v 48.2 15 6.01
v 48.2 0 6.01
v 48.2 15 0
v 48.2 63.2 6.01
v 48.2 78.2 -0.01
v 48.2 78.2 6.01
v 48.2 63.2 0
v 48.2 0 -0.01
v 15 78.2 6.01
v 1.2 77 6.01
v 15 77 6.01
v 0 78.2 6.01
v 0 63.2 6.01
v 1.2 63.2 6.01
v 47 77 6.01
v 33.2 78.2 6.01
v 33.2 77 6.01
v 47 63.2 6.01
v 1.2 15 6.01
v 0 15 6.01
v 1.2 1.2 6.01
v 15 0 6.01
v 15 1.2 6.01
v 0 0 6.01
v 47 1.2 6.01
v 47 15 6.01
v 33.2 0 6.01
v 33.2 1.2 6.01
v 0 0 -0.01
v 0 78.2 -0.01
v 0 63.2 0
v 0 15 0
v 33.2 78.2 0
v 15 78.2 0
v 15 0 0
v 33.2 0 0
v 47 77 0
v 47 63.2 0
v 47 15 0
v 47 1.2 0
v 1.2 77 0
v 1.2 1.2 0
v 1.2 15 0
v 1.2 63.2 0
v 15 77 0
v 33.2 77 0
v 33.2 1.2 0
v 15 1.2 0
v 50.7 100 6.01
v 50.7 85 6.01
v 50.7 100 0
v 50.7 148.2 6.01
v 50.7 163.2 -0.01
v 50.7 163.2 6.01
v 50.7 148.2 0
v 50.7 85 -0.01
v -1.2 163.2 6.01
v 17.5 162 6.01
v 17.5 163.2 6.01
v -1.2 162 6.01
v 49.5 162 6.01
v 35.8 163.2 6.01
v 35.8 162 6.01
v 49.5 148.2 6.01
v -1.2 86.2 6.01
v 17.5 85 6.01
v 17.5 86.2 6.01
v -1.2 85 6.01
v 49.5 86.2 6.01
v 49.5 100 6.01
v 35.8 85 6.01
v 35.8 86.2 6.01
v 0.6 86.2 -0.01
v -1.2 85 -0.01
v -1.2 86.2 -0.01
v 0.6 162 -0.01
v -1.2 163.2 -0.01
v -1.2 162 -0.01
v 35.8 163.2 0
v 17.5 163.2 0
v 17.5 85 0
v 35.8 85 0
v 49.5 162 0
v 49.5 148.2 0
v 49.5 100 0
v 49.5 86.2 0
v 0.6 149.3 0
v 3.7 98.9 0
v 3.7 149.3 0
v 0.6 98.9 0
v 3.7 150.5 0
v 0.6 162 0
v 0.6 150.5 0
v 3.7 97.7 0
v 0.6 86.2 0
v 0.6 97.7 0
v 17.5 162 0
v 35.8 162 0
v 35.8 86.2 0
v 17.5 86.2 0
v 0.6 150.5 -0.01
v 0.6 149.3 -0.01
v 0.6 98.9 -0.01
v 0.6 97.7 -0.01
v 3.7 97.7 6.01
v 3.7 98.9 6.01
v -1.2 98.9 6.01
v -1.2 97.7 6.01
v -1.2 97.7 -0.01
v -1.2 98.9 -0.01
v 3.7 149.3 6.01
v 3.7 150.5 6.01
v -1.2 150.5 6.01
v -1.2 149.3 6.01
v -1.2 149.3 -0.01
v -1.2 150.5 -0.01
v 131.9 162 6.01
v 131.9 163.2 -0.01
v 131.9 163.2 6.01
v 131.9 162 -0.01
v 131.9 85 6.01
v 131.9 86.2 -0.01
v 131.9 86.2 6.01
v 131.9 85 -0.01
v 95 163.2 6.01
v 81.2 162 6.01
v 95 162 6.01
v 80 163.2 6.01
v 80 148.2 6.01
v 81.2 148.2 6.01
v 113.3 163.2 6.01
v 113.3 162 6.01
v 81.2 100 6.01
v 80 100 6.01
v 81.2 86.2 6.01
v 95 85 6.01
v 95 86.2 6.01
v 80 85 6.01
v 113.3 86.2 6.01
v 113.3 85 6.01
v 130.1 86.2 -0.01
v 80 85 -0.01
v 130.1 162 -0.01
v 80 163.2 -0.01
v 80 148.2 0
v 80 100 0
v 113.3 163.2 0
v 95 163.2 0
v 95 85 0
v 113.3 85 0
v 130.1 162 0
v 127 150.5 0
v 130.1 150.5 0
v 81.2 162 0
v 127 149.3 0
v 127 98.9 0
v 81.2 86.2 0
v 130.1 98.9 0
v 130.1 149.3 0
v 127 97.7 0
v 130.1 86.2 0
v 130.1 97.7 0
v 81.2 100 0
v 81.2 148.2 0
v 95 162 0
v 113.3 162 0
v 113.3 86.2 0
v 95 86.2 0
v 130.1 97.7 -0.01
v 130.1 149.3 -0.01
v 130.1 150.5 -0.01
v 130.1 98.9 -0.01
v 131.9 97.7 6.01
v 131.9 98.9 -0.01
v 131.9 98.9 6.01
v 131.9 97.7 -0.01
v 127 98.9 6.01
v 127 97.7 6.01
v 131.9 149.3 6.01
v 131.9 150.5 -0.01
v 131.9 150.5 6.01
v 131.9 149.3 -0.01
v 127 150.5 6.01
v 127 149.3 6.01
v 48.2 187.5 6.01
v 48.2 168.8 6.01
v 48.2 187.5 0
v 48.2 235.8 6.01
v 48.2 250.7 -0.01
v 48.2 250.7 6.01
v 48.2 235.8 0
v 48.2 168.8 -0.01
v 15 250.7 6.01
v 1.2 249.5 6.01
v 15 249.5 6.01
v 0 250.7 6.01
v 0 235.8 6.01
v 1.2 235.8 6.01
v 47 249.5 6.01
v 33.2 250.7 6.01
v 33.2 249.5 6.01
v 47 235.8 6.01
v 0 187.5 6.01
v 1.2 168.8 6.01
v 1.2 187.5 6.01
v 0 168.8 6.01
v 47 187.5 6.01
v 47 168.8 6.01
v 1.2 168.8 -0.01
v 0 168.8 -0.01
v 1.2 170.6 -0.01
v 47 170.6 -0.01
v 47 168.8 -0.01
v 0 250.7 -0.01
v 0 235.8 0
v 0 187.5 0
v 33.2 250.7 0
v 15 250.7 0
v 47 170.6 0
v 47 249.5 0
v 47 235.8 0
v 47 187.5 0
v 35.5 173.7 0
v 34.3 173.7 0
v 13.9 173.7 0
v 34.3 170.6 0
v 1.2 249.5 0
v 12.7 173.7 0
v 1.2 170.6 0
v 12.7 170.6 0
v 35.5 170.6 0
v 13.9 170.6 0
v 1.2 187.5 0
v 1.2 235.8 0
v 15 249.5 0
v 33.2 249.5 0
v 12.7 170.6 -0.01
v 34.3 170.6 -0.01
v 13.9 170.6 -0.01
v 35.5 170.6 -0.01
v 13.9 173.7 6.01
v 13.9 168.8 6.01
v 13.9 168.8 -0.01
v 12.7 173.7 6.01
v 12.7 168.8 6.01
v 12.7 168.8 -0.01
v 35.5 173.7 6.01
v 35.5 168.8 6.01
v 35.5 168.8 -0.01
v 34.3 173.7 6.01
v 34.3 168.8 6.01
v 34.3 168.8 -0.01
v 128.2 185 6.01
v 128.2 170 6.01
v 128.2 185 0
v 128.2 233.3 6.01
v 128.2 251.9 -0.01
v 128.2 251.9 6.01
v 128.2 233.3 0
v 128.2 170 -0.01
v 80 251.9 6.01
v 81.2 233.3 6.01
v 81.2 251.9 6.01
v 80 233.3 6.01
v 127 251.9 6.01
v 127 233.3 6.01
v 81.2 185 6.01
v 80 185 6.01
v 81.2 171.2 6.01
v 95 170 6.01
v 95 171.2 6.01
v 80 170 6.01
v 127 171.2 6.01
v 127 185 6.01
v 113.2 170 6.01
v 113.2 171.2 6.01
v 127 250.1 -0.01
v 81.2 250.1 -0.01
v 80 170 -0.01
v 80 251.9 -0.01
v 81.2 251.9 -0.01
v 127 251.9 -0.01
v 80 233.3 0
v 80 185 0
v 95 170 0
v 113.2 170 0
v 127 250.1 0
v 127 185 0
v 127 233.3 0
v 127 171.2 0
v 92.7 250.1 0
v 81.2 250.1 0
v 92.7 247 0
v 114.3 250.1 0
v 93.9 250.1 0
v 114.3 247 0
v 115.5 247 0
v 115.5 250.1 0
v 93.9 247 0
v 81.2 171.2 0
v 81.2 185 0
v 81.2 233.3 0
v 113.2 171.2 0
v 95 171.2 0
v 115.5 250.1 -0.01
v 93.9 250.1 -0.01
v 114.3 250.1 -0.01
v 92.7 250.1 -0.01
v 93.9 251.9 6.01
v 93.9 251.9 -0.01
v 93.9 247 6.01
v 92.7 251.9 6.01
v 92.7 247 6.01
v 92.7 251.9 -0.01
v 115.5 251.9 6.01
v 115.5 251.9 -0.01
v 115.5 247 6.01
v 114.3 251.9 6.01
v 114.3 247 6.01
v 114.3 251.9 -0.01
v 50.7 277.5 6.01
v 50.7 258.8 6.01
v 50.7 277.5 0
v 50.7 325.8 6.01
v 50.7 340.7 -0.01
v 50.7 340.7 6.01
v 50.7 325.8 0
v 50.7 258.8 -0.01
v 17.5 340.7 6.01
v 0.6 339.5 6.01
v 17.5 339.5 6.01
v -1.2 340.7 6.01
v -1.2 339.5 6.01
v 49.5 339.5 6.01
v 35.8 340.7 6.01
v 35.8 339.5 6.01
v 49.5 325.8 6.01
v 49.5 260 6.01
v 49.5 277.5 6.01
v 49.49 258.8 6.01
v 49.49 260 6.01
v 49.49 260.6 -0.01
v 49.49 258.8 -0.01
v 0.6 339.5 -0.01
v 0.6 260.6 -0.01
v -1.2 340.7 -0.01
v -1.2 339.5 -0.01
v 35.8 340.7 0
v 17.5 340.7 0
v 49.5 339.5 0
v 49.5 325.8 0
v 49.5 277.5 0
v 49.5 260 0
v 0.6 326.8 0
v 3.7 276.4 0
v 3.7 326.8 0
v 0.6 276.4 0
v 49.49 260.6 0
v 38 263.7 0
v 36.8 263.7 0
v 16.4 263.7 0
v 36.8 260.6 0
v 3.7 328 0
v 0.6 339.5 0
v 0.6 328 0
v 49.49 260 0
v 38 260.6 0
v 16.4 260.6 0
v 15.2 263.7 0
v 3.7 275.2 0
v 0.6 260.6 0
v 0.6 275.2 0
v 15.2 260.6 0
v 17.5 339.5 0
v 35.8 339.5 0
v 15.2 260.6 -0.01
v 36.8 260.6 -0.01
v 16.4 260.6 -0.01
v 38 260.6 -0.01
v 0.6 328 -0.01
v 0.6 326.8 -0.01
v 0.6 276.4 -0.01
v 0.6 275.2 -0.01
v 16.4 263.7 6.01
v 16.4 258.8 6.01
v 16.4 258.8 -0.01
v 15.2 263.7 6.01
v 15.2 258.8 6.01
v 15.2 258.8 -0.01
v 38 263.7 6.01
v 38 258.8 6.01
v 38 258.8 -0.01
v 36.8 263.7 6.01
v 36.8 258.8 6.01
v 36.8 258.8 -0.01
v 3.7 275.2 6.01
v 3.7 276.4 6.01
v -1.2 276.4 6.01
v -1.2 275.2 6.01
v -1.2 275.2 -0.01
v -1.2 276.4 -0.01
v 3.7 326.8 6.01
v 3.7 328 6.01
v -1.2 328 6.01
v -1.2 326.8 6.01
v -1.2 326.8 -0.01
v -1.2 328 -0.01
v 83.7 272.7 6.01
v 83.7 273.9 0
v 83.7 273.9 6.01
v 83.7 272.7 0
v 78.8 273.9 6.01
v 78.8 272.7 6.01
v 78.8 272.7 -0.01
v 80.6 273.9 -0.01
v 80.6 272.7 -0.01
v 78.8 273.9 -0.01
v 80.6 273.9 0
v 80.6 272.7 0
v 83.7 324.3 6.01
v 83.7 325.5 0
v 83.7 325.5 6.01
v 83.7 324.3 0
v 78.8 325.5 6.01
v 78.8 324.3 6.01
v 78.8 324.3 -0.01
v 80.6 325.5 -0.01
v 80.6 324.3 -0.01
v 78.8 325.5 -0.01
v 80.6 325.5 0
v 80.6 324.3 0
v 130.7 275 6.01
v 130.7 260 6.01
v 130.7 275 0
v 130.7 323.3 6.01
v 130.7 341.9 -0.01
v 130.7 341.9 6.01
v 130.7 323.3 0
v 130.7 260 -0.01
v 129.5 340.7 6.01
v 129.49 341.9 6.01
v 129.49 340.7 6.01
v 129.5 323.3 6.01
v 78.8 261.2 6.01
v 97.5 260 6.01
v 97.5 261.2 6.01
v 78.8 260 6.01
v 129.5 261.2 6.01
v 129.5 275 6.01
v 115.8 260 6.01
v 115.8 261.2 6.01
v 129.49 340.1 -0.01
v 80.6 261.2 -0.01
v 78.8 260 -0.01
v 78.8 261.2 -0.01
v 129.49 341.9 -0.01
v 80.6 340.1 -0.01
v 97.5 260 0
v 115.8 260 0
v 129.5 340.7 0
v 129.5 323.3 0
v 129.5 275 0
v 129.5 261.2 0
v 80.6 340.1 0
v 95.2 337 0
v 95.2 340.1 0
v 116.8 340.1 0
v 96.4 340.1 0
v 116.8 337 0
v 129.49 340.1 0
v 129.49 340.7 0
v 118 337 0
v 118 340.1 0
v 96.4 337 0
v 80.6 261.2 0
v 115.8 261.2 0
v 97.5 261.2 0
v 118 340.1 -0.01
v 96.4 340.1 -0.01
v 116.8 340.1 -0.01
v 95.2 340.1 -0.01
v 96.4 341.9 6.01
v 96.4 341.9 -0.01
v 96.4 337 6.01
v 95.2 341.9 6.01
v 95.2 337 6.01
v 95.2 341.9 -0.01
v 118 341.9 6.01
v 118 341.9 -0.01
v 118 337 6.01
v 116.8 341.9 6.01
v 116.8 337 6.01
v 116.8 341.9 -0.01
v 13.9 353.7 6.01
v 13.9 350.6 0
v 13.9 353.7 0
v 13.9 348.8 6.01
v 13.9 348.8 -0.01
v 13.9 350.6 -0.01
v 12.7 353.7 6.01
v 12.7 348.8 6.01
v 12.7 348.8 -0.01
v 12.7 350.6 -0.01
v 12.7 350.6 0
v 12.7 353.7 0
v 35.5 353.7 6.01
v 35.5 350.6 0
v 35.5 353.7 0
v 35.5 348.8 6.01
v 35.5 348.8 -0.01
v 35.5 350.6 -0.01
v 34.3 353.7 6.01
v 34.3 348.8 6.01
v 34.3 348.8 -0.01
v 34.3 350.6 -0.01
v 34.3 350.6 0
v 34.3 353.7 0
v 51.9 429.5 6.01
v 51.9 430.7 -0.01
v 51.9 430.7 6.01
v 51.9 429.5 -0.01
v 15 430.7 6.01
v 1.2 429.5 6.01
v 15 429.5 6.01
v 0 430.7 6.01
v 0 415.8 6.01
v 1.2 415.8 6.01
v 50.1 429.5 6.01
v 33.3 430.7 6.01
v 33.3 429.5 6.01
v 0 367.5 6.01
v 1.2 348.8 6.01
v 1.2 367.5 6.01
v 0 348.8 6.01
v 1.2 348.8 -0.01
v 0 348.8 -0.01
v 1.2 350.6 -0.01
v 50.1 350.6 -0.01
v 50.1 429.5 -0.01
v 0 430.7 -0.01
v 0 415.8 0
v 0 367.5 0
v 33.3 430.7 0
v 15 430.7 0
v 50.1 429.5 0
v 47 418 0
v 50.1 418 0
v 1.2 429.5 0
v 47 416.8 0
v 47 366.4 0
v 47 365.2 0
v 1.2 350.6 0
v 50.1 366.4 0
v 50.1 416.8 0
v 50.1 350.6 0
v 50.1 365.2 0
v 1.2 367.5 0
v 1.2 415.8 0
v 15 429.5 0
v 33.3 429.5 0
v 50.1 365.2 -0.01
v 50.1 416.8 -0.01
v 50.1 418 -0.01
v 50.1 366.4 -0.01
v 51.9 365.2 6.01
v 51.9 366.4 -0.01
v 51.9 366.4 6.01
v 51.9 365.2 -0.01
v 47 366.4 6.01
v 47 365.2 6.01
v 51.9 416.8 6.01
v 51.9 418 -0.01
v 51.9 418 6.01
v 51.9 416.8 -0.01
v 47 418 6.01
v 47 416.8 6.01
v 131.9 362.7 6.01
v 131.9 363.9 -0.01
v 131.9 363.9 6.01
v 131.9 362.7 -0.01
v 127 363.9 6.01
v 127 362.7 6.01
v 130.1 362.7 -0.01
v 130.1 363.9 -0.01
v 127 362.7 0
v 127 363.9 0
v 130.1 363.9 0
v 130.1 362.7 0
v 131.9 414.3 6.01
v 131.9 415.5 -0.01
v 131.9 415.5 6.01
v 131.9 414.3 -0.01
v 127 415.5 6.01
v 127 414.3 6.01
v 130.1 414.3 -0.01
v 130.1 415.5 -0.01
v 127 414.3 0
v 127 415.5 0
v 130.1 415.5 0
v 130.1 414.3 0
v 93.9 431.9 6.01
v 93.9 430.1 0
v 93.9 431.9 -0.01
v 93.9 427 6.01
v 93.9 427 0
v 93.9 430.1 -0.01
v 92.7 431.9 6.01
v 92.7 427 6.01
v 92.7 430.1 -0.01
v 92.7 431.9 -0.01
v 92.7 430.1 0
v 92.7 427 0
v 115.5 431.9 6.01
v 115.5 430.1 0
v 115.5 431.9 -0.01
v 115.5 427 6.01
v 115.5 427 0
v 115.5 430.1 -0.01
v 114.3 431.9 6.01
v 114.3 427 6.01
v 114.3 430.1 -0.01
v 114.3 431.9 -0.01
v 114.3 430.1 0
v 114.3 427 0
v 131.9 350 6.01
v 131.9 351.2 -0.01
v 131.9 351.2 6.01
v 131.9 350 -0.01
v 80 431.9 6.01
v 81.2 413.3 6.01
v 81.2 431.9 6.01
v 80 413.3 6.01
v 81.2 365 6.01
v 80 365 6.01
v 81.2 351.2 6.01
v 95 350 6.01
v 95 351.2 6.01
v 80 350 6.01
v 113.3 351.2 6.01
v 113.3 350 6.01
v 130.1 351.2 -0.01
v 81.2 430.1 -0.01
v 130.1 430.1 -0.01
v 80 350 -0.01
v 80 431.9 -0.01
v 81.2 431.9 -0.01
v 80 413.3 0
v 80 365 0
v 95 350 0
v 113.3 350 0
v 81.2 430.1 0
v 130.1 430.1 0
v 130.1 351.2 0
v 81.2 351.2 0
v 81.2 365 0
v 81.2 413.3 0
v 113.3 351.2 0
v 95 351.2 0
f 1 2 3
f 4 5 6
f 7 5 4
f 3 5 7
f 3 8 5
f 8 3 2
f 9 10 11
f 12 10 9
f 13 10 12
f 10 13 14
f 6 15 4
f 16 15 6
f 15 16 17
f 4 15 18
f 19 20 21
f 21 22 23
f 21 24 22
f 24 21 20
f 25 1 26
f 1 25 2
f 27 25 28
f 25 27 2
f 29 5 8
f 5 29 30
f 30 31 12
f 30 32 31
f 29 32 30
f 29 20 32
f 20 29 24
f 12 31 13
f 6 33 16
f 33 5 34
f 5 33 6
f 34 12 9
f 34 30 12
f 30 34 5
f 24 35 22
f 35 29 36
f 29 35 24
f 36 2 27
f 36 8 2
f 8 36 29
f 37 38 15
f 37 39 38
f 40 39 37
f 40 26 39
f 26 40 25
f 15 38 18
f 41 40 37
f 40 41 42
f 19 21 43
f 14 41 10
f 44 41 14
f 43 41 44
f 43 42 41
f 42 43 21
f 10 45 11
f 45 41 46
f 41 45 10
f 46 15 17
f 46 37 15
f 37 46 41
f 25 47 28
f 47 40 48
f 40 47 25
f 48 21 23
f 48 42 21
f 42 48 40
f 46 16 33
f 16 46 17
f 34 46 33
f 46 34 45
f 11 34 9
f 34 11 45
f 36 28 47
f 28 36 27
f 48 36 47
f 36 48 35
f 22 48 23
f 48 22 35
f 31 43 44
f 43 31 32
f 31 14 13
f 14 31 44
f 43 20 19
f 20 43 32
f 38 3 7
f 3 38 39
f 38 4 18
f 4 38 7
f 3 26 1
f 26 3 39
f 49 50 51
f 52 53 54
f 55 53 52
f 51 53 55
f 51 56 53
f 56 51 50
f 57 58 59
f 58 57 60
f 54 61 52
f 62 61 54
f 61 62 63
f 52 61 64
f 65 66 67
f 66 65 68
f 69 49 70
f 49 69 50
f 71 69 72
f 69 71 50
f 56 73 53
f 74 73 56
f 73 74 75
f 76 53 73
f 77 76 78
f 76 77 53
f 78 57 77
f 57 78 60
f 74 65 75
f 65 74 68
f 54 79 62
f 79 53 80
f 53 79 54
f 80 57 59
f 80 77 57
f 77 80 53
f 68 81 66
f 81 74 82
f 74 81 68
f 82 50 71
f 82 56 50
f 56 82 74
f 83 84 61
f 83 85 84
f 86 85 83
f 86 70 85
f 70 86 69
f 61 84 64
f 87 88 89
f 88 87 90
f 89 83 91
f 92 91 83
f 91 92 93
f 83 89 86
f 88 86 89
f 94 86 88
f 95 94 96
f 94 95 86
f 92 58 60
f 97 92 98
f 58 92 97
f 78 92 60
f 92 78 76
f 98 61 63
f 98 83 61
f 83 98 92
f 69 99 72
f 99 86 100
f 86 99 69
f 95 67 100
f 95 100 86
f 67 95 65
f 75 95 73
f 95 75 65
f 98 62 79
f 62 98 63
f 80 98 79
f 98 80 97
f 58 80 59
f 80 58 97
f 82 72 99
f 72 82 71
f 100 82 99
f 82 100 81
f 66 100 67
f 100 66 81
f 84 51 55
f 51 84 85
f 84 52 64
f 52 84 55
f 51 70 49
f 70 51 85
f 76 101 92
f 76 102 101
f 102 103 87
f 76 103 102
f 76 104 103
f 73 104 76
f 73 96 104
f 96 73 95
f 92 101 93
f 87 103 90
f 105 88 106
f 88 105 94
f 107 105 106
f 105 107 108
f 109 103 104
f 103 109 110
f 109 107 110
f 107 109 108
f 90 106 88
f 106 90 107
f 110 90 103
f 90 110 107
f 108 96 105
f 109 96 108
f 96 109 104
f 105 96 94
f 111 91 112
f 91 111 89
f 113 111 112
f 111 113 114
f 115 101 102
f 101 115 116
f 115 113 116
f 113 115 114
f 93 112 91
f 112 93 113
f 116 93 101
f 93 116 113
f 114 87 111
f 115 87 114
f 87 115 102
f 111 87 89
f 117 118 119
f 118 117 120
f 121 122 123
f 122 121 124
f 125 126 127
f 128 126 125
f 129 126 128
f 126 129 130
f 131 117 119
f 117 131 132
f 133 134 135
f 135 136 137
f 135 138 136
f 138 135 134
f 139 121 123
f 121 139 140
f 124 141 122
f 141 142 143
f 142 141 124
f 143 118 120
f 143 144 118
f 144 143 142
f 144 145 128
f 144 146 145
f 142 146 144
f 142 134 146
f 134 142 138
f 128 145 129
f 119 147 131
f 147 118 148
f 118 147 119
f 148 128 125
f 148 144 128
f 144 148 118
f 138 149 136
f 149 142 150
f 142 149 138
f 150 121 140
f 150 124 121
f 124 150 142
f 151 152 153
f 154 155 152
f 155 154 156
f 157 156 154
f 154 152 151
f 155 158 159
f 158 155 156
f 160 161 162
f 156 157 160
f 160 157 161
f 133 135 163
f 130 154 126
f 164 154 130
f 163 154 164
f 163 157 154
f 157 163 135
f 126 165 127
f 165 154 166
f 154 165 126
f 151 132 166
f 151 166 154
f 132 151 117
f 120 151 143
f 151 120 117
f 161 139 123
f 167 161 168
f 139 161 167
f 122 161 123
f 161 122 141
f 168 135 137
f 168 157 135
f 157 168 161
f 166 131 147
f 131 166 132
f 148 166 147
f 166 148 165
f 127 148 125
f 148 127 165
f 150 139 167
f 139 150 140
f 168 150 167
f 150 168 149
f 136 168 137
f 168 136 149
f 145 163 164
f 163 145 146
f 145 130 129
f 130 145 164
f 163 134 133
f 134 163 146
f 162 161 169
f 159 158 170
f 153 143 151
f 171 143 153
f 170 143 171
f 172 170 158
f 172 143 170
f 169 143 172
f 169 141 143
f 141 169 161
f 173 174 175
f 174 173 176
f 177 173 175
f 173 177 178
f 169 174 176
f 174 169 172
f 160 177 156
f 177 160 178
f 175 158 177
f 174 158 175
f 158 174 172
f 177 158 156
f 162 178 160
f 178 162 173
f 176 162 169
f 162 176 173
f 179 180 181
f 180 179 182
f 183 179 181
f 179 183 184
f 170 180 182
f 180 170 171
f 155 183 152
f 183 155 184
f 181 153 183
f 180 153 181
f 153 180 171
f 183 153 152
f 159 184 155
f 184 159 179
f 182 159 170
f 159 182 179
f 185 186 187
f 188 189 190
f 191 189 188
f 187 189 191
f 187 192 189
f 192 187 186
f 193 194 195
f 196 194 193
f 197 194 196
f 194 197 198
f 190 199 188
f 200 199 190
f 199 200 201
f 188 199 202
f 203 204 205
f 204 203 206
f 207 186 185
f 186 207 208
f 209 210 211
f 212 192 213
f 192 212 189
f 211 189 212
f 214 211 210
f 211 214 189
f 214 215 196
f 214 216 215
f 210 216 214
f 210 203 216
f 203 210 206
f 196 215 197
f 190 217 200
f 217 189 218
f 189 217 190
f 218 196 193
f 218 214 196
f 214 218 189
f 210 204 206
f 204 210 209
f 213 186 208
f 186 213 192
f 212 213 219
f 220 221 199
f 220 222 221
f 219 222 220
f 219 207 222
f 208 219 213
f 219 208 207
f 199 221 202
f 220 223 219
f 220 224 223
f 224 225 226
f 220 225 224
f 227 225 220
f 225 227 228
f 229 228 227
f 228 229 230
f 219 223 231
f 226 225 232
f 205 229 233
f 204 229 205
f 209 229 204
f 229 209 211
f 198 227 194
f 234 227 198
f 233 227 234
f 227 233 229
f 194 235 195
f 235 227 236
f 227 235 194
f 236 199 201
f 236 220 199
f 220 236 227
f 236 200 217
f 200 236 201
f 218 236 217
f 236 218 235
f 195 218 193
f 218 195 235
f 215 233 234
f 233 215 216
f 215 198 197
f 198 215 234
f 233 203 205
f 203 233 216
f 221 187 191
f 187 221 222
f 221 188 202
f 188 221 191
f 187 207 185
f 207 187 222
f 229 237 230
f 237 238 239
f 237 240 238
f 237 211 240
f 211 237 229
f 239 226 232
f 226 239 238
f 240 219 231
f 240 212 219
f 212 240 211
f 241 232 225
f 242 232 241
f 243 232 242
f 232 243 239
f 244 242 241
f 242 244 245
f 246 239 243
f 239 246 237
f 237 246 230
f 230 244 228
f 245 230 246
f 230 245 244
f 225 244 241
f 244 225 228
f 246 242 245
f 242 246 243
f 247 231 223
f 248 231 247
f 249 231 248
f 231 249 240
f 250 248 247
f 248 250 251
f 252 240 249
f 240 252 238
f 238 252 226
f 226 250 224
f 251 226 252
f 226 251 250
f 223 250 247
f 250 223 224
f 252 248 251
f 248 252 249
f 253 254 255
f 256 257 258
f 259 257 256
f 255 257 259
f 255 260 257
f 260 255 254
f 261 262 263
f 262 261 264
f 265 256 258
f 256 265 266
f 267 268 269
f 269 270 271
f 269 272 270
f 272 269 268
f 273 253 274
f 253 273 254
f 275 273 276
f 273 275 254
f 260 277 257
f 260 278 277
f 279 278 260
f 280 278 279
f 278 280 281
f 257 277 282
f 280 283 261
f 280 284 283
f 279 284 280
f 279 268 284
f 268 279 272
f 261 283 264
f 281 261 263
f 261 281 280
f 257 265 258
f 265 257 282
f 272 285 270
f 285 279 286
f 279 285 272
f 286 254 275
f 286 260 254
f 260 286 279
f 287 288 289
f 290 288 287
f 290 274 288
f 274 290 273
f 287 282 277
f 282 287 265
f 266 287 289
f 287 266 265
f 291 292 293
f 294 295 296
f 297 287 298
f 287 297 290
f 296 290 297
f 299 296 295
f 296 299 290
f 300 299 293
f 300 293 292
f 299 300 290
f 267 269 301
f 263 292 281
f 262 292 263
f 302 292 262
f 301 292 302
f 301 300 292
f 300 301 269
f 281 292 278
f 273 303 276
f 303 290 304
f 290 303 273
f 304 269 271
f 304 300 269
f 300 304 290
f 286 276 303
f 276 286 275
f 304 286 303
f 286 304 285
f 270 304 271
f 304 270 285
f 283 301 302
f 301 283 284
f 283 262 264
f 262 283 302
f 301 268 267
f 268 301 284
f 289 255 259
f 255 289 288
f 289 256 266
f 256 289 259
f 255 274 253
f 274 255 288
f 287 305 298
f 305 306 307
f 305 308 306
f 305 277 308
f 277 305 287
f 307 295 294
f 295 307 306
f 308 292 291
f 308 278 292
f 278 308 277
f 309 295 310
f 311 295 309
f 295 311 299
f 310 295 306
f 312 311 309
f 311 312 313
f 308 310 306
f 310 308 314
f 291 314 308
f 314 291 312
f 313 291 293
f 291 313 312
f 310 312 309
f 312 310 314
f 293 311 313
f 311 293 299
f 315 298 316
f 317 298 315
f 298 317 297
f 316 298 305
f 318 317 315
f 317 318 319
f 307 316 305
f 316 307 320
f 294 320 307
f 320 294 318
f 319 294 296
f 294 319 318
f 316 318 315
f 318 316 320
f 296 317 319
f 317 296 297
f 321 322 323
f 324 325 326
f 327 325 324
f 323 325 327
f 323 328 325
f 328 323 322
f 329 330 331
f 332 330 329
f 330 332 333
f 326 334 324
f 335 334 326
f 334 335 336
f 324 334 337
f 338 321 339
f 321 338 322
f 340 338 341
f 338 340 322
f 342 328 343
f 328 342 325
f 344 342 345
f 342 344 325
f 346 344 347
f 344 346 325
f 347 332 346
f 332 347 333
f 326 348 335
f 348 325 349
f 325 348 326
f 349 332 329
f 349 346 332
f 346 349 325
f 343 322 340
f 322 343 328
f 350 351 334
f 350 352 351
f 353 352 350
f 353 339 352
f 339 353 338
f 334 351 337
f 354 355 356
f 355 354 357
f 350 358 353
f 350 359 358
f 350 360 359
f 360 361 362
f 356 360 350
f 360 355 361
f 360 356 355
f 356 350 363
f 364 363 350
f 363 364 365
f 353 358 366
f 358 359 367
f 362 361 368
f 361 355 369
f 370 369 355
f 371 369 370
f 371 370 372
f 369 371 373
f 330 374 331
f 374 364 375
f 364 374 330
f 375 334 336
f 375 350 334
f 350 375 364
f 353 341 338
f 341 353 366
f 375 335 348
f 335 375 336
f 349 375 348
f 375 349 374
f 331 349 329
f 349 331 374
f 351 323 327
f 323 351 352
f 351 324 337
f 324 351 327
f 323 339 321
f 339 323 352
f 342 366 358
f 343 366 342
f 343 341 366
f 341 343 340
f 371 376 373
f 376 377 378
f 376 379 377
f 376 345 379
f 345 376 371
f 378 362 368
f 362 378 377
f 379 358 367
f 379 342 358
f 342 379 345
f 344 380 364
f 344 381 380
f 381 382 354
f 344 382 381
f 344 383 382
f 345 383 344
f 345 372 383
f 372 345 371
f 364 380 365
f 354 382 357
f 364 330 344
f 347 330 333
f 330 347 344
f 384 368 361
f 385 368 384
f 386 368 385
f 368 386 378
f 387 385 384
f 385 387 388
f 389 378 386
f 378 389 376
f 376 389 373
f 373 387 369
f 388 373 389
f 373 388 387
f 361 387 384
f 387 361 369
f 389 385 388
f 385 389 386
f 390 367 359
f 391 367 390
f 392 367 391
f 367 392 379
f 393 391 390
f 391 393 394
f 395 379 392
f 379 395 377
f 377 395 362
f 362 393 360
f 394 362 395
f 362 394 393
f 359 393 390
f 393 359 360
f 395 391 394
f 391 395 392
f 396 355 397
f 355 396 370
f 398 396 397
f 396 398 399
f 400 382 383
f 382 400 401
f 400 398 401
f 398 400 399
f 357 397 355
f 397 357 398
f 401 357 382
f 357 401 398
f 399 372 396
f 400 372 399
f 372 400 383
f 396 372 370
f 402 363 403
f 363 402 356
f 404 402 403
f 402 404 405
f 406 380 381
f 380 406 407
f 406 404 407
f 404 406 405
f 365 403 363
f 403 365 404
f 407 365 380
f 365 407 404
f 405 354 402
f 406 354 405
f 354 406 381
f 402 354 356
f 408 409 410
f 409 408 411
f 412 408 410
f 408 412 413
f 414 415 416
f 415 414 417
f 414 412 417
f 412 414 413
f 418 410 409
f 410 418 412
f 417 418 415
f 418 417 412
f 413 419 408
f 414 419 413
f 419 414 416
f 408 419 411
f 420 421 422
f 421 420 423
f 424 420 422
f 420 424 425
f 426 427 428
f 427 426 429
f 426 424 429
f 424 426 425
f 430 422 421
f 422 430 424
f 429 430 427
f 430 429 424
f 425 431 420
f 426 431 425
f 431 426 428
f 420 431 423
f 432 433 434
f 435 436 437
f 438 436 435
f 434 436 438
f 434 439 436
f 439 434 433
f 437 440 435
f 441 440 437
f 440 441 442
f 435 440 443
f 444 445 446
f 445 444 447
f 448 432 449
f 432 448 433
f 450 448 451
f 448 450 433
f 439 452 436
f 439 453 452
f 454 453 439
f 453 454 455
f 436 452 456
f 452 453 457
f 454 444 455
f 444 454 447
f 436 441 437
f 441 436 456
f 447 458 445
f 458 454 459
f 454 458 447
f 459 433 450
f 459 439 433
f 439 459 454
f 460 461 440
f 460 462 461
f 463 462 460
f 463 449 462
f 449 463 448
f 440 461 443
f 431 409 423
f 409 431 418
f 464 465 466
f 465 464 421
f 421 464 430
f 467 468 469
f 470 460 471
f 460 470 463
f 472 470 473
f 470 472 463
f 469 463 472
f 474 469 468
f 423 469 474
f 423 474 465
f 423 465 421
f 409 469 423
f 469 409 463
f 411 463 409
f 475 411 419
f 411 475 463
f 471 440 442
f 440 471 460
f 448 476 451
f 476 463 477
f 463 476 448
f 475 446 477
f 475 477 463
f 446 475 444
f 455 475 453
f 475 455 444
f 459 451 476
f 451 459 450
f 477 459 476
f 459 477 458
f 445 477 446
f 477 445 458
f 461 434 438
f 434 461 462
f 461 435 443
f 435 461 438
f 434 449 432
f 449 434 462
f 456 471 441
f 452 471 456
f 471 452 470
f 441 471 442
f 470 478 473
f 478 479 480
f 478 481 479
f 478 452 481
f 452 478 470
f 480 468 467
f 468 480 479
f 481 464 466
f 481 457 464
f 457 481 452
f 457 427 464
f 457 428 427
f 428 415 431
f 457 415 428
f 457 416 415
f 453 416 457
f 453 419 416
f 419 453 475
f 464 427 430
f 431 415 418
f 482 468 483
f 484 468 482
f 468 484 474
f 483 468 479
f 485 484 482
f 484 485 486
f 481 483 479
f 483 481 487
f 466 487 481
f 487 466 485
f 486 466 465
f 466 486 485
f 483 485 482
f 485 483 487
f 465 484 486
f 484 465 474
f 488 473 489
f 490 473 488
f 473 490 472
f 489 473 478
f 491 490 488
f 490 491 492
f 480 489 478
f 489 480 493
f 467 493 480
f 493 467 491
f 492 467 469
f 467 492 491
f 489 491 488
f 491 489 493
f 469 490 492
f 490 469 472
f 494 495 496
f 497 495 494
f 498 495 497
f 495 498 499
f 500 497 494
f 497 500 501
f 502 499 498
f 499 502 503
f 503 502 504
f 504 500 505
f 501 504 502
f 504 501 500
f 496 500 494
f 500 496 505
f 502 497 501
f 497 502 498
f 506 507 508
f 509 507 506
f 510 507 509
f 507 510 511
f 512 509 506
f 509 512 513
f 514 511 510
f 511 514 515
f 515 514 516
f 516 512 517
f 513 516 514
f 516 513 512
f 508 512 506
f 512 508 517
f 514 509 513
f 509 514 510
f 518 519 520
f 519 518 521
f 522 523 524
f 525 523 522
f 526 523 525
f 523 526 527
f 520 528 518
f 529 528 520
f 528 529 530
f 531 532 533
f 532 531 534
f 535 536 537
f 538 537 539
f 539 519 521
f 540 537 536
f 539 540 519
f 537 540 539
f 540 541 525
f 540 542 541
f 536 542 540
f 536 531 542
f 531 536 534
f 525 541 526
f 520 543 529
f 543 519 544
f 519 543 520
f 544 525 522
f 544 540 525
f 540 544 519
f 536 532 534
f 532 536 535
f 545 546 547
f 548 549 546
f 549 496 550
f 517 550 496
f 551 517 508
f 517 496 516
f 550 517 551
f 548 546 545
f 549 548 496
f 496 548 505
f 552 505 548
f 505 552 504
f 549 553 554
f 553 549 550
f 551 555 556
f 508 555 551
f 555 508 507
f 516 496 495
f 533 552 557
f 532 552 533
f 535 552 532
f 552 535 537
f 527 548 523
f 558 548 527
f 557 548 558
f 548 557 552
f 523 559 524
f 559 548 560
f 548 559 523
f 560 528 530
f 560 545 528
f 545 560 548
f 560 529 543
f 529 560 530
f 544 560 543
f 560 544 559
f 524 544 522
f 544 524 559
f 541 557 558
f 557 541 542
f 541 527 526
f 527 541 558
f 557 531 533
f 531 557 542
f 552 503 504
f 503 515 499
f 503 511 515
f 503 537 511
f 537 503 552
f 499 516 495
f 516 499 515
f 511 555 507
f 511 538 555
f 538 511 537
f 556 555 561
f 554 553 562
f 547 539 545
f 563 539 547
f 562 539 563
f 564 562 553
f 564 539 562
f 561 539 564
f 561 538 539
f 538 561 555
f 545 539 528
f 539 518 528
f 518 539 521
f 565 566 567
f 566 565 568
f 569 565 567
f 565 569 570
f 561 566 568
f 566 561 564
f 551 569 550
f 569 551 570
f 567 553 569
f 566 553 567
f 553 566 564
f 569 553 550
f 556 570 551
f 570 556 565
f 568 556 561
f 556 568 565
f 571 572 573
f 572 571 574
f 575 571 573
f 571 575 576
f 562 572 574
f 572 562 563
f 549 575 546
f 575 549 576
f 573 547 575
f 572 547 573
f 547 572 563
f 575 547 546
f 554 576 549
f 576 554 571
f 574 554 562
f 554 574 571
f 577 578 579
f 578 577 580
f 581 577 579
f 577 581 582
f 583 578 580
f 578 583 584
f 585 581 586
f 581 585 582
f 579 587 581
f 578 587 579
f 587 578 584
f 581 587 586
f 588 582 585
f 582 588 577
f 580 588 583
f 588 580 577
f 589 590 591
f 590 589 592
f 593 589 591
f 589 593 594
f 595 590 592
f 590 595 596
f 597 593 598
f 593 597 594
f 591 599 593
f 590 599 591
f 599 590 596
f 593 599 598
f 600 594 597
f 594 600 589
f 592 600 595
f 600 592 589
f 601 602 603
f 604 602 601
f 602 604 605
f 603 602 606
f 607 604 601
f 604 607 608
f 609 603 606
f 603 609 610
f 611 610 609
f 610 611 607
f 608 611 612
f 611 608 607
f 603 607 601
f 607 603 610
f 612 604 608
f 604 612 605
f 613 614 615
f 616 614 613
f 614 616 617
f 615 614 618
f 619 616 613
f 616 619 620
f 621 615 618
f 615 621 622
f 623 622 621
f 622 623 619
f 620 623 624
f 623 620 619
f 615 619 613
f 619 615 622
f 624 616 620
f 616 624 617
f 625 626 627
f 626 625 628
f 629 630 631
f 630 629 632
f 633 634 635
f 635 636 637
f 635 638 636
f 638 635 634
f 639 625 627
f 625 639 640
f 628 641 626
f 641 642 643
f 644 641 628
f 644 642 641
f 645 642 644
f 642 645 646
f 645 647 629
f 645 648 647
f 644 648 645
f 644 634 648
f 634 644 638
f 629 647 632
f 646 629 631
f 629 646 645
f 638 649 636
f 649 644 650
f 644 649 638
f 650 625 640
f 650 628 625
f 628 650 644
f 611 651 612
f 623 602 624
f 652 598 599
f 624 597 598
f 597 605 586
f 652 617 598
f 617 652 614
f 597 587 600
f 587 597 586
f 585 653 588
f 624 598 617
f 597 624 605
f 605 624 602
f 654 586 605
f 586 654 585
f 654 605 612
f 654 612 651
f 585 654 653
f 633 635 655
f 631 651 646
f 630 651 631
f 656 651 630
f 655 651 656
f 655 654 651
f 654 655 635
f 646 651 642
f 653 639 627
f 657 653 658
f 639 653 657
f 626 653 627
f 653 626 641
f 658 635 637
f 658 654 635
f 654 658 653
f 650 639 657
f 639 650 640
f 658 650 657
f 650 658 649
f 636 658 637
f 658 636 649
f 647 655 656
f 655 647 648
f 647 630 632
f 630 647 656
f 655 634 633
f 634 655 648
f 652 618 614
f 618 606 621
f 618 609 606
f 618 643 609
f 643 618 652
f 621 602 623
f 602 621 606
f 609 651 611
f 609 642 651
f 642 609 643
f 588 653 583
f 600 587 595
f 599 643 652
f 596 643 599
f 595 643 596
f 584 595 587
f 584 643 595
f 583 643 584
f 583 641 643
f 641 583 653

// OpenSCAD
// file: ../../Base/Boxes.scad
// Fischertechnik Box Foundation
// Pre-designed Boxes

use <Constants.scad>

include <PlacementOptions.scad>

box190Width = 190;
box190Depth = 130;
box130Width = 130;
box130Depth = 95;
boxUsageHeight = 33.9;
boxWallThickness = 2.4;
boxBaseThickness = 1.0;

// getBoxWallThickness()
// Gets the wall thickness of a Fischertechnik Box

function getBoxWallThickness() = boxWallThickness;

// Gets the usable height of a fischertechnik box
function getBoxUsageHeight() = boxUsageHeight;

// Gets the thickness of the Fischertechnik box base.
function getBoxBaseThickness() = boxBaseThickness;

// Gets the usable inner space of a Box 190 as an x/y-list
function getBox190Space() = [
    box190Width - 2*getBoxWallThickness(), 
    box190Depth - 2*getBoxWallThickness() ];

// Imports the Fischertechnik empty box 130x190 mm and places it at position 0,0
// 190x130 are the outer sizes, the inner space is slightly smaller. Use getBox190Space() to get the inner sizes.
// This module needs the STL file "Fischertechnik Box 130x190.stl" in the library path.
// The box is positioned that the usable inner space is at the 0,0,0 position. The

module Box190() {
    translate([-getBoxWallThickness(),-getBoxWallThickness(),-getBoxBaseThickness()])
        import("Fischertechnik Box 130x190.stl", convexity=3);
}

// Gets the usable inner space of a Box 130 as an x/y-list
function getBox130Space() = [
    box130Width - 2*getBoxWallThickness(), 
    box130Depth - 2*getBoxWallThickness() ];

// Imports the Fischertechnik empty box 95x130 mm and places it at position 0,0
// 190x130 are the outer sizes, the inner space is slightly smaller. Use getBox190Space() to get the inner sizes.
// This module needs the STL file "Fischertechnik Box 95x130.stl" in the library path.
// The box is positioned that the usable inner space is at the 0,0,0 position. The

module Box130() {
    translate([-getBoxWallThickness(),-getBoxWallThickness(),-getBoxBaseThickness()])
        import("Fischertechnik Box 95x130.stl", convexity=3);
}

// Creates a web at the specified box walls
// corner 0 = LowerLeft, 1 = UpperLeft, 2 = UpperRight, 3 = LowerRight
// side 0 = LeftOfCorner, 1 = RightOfCorner
// distance = Distance in mm from the corner
// box = inner width and depth of the box (default: Box 190)
// webWidth = length of the web (default is 3 mms)
// webThickness = thickness of the web (default is 1 mm)

module BoxWeb(corner, side, distance, box=getBox190Space(), webWidth=3, webThickness=1.0) {
    sink = getBoxWallThickness()/2;

    width = (corner % 2 == 0) ? 
            (side == LeftOfCorner ? webWidth : webThickness) :
            (side == LeftOfCorner ? webThickness : webWidth);

    depth = (corner % 2 == 0) ? 
            (side == RightOfCorner ? webWidth : webThickness) :
            (side == RightOfCorner ? webThickness : webWidth);
    
    xDiff = corner == LowerLeft ? 
                (side == LeftOfCorner ? -sink : distance) :
            (corner == UpperLeft ?                
                (side == LeftOfCorner ? distance : -sink) :
            (corner == UpperRight ?
                (side == LeftOfCorner ? box.x-webWidth+sink : box.x-distance-webThickness) :
                (side == LeftOfCorner ? box.x-distance-webThickness: box.x-webWidth+sink)));

    yDiff = corner == LowerLeft ? 
                (side == RightOfCorner ? -sink : distance) :
            (corner == UpperLeft ?
                (side == RightOfCorner ? box.y-distance : box.y-webWidth+sink) :
            (corner == UpperRight ?
                (side == RightOfCorner ? box.y-webWidth+sink : box.y-distance) :
                (side == RightOfCorner ? distance : -sink)));
    
    translate([xDiff, yDiff, -getExcess()])
        cube([width, depth, boxUsageHeight + 2*getExcess()]);
}
// file: ../../Base/Rotation.scad
// Fischertechnik Box Foundation
// Geometry Helpers Rotation

include <PlacementOptions.scad>

// getRotatedSpace(space, rotation=NoRotation)
// Rotates the space dependent on the specified rotation

function getRotatedSpace(space, rotation=NoRotation) = [
    (rotation == Rotate90 || rotation == Rotate270) ? space.y : space.x,
    (rotation == Rotate90 || rotation == Rotate270) ? space.x : space.y
];

// Rotates the given space around the fixed left lower corner
// space = the space the children needs as width/depth list [width,depth]
// rotation = 0 Rotate0 degrees, 1 Rotate90 degrees, 2 Rotate180 degrees, 3 Rotate270 degrees (equivalent to -90)

module RotateFix(space, rotation=Rotate0) {
    dy = (rotation == Rotate0 || rotation == Rotate270) ? 0 :
        (rotation == Rotate90) ? space.x :
        space.y;
    dx = (rotation < Rotate180) ? 0 :
        (rotation == Rotate180) ? space.x :
        space.y;
    
    translate([dx, dy, 0])
        rotate([0, 0, rotations[rotation]])
            children();
}
// file: ../../Base/Alignment.scad
// Fischertechnik Box Foundation
// Geometry Helpers Alignment

include <PlacementOptions.scad>

// getAlignedX(elementWidth, spaceWidth, align=AlignRight, offset=0)
// Gets the aligned X offset of an element with the given
// width in the given space.
// elementWidth = The width of the element to positon
// spaceWidth = The space where the element should be aligned
// align = 0 AlignLeft, 1 AlignCenter, 2 AlignRight
// offset = an optional offset from the aligned position. When
// aligned left or centered, then positive values are in X direction.
// When aligned right then positive values are in negative X direction.

function getAlignedX(elementWidth, spaceWidth, align=AlignRight, offset=0) =
    (align == AlignLeft) ?
        offset :
        ((align == AlignCenter) ?
        (spaceWidth - elementWidth)/2 + offset :
        spaceWidth - offset - elementWidth);

// getAlignedY(elementDepth, spaceDepth, align=AlignTop, offset=0)
// Gets the aligned Y offset of an element with the given
// depth in the given space.
// elementDepth = The depth of the element to positon
// spaceDepth = The space where the element should be aligned
// align = 0 AlignBottom, 1 AlignCenter, 2 AlignTop
// offset = an optional offset from the aligned position. When
// aligned bottom or centered, then positive values are in Y direction.
// When aligned top then positive values are in negative Y direction.

function getAlignedY(elementDepth, spaceDepth, align=AlignTop, offset=0) =
    (align == AlignBottom) ?
        offset :
        ((align == AlignCenter) ?
        (spaceDepth - elementDepth)/2 + offset :
        spaceDepth - offset - elementDepth);
// file: ../../Base/Constants.scad
// Fischertechnik Box Foundation
// Constants

// Constant values necessary for multiple elements

// Base constants
dividerThickness = 1.2;
excess = 0.01;
fragments = 90;
tolerance = 0.8;

// Gets the thickness of a divider 
function getDividerThickness() = dividerThickness;

// Gets the excess that is used to merge walls into each other
function getExcess() = excess;

// Gets amount of fragments of a cylinder
function getFragments() = fragments;

// Gets the inner tolerance of a frame to each side
function getTolerance() = tolerance;


// Fischertechnik specific constants
axisDiameter = 4;
axisBottomDiameter = axisDiameter + 1;
standardEdgeDistance = 2.5;
standardWebDistance = 11.5;
standardCornerLength = 15;
tubeWallFactor = 1.6;

// Gets axis diameter
function getAxisDiameter() = axisDiameter;

// Gets axis bottom diameter for thicker part at the bottom
function getAxisBottomDiameter() = axisBottomDiameter;

// gets the standard distance to the wall of the box for dockable frames with webs
function getStandardEdgeDistance() = standardEdgeDistance;

// gets the standard distance of each web to the corner of the dockable frame
function getStandardWebDistance() = standardWebDistance;

// gets the standard length of the corner walls of a dockable frame
function getStandardCornerLength() = standardCornerLength;

// gets the wall thickness of a tube.
function getTubeWallThickness() = tubeWallFactor * getDividerThickness();
// file: ../../Base/PlacementOptions.scad
// Fischertechnik Box Foundation
// Placement Options

// Alignment
NoAlign = 0;
AlignLeft = 1;
AlignBottom = 2;
AlignCenter = 3;
AlignRight = 4;
AlignTop = 5;

// Element rotation degree steps
rotations = [0, -90, -180, -270];

// Rotation
NoRotation = 0;
Rotate0 = 0;
Rotate90 = 1;
Rotate180 = 2;
Rotate270 = 3;

// Docking (seen from above)
NoDock = -1;
DockLeft = 0;
DockTop = 1;
DockRight = 2;
DockCorner = 2;
DockBottom = 3;

// Web corners
LowerLeft = 0;
UpperLeft = 1;
UpperRight = 2;
LowerRight = 3;

// Web position relative to corner
LeftOfCorner = 0;
RightOfCorner = 1;
// file: ../../Elements/FrameElectronicBlock.scad
// Fischertechnik Box Library
// Frame for Electronic Blocks ("Silberlinge")
// 36391,36392,36393,36394,36479,36480,36481,36482,36483

use <../Base/Constants.scad>
use <../ModelBase/Simple.scad>
use <../ModelBase/Complex.scad>

include <../Base/PlacementOptions.scad>

width = 45;
depth = 75;
height = 6;

// getFrameCassetteSpace(edges)
// getFrameElectronicBlockSpace(alignX, alignY)
// alignX 0=NoAlign 1=AlignLeft 3=AlignCenter 4=AlignRight 
// alignY 0=AlignNo 2=AlignBottom 3=AlignCenter 5=AlignTop
// Gets the space the frame for a cassette needs as width and depth(.x and .y as a list). 

function getFrameElectronicBlockSpace(alignX=NoAlign, alignY=NoAlign) = 
    getDockableEdgedFrameSpace([width, depth, height], alignX, alignY);

// FrameElectronicBlock(alignX, alignY)
// Frame for cassette.
// alignX 0=NoAlign 1=AlignLeft 3=AlignCenter 4=AlignRight 
// alignY 0=AlignNo 2=AlignBottom 3=AlignCenter 5=AlignTop

module FrameElectronicBlock(alignX=NoAlign, alignY=NoAlign) {
    DockableEdgedFrame([width, depth, height], alignX, alignY);
}

// Test
color("lightgray") {
    FrameElectronicBlock();
}
// file: ../../Base/Placement.scad
// Fischertechnik Box Foundation
// Geometry Helpers Placement

use <Constants.scad>
use <Alignment.scad>
use <Rotation.scad>
use <Boxes.scad>

include <PlacementOptions.scad>

// Place(x=0, y=0, elementSpace=[0,0], alignX=AlignLeft, alignY=AlignBottom, rotation=Rotate0, boxSpace=getBox190Space())
// Places the child at the specified position
// y = Y-Position. This is a relative position when an X aligment is specified.
// x = X-Position. This is a relative position when an Y aligment is specified.
// elementSpace = space of the element to be placed [x,y]
// alignX = -1=NoAlign, 0 AlignLeft, 1 AlignCenter, 3 AlignRight (elementSpace and boxSpace required!)
// alignY = -1=NoAlign, 2 AlignBottom, 1 AlignCenter, 4 AlignTop (elementSpace and boxSpace required!)
// rotation = 0 Rotate0 0 degrees, 1 Rotate90 90 degrees, 
// 2 Rotate180 180 degrees, 3 Rotate270 270 degrees (equivalent to -90)
// boxSpace = Inner space of the box where the placement occurs [x,y] - default is Box 190x130 inner space

module Place(x=0, y=0, elementSpace=[0,0], 
  alignX=AlignLeft, alignY=AlignBottom, 
  rotation=NoRotation, boxSpace=getBox190Space()) {

    module Position(x, y, space, rotation=Rotate0) {
        translate([x, y, 0])
            RotateFix(space, rotation)
                children(0);
    }

    space = getRotatedSpace(elementSpace, rotation);
    alignedX = getAlignedX(space.x, boxSpace.x, alignX, x);
    alignedY = getAlignedY(space.y, boxSpace.y, alignY, y);
    Position(alignedX, alignedY, elementSpace, rotation)
        children(0);
}

// Center(space=getBox130Space(), elementSpace=[0,0])
// space = Space where the children is centered. For cylinder use centered=true and no elementSpace.
// elementSpace = space of the element to be centered [x,y]

module Center(space=getBox190Space(), elementSpace=[0,0]) {
    translate([(space.x - elementSpace.x) / 2, (space.y - elementSpace.y) / 2])
        children(0);
}

// CenterHorizontal(width=0, y=0, offset=0, space=getBox130Space())
// space = Space where the children is centered. For cylinder use centered=true and no elementSpace.
// elementSpace = space of the element to be centered [x,y]

module CenterHorizontal(width=0, y=0, offset=0, space=getBox190Space()) {
    translate([(space.x - width) / 2 + offset, y])
        children(0);
}

// CenterVertical(depth=0, x=0, offset=0, space=getBox130Space())
// space = Space where the children is centered. For cylinder use centered=true and no elementSpace.
// elementSpace = space of the element to be centered [x,y]

module CenterVerticalal(depth=0, x=0, offset=0, space=getBox190Space()) {
    translate([x, (space.y - depth) / 2 + offset])
        children(0);
}
// main file
// Fischertechnik Box Foundation
// Elements
// Test FrameElectronicBlock

use <../../Base/Placement.scad>
use <../../Elements/FrameElectronicBlock.scad>

include <../../Base/PlacementOptions.scad>

FrameElectronicBlock();

Place(0, 85)
    FrameElectronicBlock(alignX=AlignLeft);

Place(80, 85)
    FrameElectronicBlock(alignX=AlignRight);

Place(0, 170)
    FrameElectronicBlock(alignY=AlignBottom);

Place(80, 170)
    FrameElectronicBlock(alignY=AlignTop);

Place(0, 260)
    FrameElectronicBlock(alignX=AlignLeft, alignY=AlignBottom);

Place(80, 260)
    FrameElectronicBlock(alignX=AlignLeft, alignY=AlignTop);

Place(0, 350)
    FrameElectronicBlock(alignX=AlignRight, alignY=AlignBottom);

Place(80, 350)
    FrameElectronicBlock(alignX=AlignRight, alignY=AlignTop);
